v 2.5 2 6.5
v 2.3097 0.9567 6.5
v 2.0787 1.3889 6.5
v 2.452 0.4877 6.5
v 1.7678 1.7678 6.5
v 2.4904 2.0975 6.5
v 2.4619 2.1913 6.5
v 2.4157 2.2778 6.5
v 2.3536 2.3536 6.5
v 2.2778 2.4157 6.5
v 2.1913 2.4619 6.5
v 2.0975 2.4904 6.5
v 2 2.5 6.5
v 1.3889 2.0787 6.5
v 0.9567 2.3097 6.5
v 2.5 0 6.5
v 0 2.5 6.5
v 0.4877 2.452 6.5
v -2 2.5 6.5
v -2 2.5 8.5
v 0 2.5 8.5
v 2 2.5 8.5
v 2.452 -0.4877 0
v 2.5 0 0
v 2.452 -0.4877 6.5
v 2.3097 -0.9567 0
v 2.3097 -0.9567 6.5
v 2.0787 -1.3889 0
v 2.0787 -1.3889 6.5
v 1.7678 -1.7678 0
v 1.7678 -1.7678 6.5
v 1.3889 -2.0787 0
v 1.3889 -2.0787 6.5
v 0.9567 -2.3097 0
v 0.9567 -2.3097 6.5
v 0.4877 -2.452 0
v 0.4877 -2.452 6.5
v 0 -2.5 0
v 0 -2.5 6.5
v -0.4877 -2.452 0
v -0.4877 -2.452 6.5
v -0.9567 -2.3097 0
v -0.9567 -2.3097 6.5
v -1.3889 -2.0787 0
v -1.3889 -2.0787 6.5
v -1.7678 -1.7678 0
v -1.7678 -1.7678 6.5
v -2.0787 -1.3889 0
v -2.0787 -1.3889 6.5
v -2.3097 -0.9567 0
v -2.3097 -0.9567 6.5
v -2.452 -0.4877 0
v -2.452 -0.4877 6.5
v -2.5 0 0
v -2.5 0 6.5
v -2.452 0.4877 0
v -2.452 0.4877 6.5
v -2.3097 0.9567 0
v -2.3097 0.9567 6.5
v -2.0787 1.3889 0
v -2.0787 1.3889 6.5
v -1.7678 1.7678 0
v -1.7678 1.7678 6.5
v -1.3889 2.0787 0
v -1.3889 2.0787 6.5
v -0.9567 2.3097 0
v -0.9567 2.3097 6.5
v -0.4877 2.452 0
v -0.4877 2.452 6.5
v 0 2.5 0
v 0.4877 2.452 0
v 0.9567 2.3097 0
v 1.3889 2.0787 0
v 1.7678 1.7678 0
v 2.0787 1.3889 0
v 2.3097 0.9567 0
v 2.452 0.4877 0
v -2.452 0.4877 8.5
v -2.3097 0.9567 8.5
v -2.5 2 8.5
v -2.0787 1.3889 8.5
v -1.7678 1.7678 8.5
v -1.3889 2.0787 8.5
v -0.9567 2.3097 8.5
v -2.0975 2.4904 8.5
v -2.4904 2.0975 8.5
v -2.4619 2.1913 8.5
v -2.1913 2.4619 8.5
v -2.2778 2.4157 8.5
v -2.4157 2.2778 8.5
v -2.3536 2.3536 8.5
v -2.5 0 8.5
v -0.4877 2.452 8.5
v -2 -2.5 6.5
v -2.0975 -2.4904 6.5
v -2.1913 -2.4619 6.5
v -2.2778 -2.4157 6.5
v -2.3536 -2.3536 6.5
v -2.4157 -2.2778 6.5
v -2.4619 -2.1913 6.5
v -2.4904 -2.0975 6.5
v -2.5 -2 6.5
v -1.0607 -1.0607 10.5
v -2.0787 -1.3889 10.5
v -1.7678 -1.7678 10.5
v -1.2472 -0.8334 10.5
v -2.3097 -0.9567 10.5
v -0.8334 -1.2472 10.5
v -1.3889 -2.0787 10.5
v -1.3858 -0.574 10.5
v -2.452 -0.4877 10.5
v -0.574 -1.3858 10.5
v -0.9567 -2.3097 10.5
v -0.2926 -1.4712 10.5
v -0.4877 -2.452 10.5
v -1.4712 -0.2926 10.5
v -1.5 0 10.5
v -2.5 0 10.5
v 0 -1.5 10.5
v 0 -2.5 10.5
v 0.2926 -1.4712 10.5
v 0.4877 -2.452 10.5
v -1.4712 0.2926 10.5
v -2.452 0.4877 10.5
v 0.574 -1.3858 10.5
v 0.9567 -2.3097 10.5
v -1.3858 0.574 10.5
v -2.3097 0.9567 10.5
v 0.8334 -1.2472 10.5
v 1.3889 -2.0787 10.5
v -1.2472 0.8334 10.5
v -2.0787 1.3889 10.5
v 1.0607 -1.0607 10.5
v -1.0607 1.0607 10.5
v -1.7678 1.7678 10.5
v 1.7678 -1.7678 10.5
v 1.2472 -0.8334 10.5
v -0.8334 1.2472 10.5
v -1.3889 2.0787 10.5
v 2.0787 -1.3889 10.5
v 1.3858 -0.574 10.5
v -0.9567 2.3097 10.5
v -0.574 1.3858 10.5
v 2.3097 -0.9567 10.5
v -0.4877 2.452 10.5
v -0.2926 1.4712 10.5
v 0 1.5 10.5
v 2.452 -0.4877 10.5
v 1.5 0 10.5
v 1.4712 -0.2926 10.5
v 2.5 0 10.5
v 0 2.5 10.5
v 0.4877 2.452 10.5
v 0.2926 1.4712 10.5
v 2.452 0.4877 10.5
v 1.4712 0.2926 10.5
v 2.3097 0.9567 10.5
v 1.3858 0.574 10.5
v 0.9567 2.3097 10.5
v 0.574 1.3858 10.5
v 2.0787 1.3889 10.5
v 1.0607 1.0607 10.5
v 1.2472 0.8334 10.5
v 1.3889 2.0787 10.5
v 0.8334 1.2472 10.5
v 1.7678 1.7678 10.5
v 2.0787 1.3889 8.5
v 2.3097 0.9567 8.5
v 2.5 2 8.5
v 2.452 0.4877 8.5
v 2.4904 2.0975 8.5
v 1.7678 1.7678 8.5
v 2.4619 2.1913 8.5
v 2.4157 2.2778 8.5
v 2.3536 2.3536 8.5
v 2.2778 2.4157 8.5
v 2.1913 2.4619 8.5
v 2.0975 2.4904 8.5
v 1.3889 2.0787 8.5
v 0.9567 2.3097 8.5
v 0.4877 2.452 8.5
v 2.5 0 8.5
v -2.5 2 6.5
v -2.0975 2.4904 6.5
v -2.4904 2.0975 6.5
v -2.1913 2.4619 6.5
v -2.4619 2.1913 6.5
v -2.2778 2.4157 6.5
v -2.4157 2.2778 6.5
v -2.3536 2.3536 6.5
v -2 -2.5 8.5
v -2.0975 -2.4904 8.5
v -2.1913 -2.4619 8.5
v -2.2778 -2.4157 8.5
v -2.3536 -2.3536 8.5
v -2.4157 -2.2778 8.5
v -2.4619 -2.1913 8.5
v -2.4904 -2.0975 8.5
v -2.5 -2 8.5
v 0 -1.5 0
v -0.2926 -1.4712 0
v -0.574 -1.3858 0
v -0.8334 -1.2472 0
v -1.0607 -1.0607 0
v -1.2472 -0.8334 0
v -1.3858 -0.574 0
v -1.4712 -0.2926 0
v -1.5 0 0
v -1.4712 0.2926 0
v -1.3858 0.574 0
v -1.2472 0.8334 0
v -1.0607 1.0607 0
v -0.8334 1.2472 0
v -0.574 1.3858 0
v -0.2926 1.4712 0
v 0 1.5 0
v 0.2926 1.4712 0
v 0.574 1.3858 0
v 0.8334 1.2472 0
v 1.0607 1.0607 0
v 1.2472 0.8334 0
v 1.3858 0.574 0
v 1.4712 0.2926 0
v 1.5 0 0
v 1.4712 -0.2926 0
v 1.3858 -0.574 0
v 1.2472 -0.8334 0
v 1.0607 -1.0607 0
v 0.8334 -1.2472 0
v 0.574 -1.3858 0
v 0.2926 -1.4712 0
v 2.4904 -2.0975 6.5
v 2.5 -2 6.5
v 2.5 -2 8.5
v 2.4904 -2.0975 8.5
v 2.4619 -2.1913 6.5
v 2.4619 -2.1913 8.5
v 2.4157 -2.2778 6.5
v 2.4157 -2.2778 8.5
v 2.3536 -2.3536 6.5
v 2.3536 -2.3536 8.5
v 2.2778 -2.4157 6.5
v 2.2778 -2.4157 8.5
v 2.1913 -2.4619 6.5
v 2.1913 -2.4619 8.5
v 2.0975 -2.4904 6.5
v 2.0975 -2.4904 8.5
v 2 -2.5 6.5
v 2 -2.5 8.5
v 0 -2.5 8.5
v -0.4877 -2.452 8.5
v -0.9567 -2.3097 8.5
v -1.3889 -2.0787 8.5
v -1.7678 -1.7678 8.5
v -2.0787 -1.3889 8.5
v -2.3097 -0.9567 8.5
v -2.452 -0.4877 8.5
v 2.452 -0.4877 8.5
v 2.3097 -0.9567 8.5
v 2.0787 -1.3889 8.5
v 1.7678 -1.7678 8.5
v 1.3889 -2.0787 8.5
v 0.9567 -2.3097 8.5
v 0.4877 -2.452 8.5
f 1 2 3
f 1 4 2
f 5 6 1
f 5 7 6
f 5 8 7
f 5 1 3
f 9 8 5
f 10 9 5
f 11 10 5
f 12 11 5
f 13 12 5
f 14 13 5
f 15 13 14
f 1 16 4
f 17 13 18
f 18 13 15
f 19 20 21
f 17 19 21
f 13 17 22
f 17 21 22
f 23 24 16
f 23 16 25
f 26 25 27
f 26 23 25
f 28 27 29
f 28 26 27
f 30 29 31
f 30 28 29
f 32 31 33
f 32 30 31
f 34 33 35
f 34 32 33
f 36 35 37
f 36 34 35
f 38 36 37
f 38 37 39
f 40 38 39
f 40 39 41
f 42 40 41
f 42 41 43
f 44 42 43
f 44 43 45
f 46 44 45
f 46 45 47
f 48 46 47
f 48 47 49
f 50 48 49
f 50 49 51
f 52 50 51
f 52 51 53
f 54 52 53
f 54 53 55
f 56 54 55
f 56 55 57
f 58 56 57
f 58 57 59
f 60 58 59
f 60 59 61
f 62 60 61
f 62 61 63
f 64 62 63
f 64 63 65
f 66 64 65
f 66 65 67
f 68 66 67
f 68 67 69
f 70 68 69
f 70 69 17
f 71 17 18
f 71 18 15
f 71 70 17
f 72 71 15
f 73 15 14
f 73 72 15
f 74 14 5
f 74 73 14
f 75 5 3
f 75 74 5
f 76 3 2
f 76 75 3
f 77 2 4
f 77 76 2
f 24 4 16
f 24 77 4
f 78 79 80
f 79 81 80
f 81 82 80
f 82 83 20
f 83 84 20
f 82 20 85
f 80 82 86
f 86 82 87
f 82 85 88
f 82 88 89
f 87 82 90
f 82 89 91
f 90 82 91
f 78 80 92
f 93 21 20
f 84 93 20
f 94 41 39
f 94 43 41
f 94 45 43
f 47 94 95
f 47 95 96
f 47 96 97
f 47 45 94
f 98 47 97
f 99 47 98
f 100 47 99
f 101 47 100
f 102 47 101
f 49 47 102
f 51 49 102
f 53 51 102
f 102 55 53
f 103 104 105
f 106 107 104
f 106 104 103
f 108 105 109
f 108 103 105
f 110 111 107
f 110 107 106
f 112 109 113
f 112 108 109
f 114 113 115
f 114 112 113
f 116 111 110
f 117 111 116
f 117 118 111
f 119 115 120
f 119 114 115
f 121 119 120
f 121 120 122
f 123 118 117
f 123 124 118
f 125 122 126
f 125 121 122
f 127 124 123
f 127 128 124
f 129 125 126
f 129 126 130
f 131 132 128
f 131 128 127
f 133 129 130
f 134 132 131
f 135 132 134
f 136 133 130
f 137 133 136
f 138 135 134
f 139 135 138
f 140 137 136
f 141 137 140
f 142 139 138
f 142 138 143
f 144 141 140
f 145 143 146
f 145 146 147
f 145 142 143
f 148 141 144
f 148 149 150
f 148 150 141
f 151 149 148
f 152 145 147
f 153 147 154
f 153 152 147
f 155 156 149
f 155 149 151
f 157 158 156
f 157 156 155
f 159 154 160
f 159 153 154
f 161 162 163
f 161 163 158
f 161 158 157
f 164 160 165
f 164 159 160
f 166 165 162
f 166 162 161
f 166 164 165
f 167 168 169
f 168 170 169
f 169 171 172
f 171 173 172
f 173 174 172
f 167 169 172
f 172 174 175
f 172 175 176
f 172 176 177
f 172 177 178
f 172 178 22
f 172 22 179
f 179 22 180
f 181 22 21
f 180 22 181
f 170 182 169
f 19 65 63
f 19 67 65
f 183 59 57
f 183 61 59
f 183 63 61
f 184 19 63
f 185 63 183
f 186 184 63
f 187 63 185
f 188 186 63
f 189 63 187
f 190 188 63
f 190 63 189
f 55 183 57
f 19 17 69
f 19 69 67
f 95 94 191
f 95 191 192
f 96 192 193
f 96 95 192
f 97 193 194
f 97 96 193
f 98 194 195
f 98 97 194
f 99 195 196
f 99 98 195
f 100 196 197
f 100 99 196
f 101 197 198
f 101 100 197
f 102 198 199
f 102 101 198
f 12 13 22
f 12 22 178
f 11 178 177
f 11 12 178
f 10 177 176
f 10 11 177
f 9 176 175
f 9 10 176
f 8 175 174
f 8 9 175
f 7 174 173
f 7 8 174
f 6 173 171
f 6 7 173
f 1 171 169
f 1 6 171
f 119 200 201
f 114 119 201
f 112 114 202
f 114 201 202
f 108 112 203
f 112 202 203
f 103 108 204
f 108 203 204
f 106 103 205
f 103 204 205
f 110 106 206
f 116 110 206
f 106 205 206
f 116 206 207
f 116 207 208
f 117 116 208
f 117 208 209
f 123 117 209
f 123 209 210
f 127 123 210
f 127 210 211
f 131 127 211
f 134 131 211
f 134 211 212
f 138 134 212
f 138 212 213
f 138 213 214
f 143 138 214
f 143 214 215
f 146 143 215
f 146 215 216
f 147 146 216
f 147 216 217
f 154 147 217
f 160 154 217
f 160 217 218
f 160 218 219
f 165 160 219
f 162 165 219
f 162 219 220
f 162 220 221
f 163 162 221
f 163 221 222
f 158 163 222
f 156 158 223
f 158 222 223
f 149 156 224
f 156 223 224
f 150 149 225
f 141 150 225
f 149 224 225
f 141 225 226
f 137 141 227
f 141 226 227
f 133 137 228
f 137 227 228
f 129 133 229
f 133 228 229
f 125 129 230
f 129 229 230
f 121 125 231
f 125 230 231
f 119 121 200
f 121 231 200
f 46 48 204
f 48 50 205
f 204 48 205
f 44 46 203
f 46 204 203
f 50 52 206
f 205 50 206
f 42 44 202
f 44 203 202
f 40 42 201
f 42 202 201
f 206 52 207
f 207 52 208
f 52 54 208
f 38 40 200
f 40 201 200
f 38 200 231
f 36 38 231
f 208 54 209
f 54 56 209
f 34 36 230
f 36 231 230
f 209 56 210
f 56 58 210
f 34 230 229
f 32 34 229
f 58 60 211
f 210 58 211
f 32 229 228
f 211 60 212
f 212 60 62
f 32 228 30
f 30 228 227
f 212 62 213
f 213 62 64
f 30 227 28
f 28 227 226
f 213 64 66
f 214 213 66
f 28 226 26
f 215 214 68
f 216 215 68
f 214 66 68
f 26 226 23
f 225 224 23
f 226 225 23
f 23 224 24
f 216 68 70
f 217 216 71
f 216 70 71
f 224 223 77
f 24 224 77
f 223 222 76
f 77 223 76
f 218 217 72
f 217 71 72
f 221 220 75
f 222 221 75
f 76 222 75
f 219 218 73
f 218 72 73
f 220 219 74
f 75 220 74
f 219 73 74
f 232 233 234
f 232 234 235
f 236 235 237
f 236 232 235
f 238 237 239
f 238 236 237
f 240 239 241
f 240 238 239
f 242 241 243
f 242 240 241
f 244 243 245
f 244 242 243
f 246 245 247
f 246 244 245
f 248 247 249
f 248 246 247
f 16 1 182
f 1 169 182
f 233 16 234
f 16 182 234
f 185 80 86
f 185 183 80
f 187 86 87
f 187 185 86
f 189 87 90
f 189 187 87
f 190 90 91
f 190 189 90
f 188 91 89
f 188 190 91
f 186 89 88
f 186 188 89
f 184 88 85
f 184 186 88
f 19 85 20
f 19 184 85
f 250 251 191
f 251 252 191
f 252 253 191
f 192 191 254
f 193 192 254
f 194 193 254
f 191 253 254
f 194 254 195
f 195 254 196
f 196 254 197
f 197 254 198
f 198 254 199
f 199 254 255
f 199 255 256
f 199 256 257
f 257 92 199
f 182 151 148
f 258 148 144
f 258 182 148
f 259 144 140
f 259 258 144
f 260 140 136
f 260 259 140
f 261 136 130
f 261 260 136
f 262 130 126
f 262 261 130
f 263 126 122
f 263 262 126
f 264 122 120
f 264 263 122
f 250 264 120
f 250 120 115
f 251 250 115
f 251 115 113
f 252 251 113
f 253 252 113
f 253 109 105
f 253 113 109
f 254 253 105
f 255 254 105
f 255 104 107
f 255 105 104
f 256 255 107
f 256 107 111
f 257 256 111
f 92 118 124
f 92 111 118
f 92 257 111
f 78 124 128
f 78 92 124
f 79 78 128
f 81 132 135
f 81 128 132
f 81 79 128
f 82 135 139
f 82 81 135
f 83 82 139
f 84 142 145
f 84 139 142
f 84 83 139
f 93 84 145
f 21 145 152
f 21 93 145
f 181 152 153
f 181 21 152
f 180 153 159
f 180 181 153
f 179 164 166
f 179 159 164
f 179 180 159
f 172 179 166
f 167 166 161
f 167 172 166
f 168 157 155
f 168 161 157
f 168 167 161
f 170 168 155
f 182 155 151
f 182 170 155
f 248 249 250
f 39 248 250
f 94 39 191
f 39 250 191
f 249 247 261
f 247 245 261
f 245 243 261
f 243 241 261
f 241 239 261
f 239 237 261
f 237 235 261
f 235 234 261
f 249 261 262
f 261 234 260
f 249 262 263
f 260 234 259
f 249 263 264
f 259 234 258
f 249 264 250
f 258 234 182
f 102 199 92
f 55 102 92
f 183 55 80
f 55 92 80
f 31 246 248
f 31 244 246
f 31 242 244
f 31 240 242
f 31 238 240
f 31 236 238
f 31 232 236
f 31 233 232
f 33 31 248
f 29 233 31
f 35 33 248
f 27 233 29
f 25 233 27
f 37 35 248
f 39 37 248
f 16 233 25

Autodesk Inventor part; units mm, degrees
ref_plane "YZ Plane" through (0, 0, 0) normal (1, 0, 0) x (0, 1, 0)
ref_plane "XZ Plane" through (0, 0, 0) normal (0, 1, 0) x (-1, 0, 0)
sketch "Skizze1" plane through (0, 0, 0) normal (0, 0, 1) x (1, 0, 0)
  circle A0 centre (0, 0) radius 2.5
  dimension "d1" = 5
extrude "Extrusion1" add sketch "Skizze1" along normal blind 10.5
thread "Gewinde1" size "M5x0.8" class "6g" standard "ANSI Metric M Profile" length 4.5
sketch "Skizze2" plane through (0, 0, 10.5) normal (0, 0, 1) x (1, 0, 0)
  circle A0 centre (0, 0) radius 1.5 projected
ref_plane "Arbeitsebene1" through (0, 0, 8.5) normal (0, 0, -1) x (-1, 0, 0)
sketch "Skizze3" plane through (0, 0, 8.5) normal (0, 0, -1) x (-1, 0, 0)
  line L0 (-2.5, -2.5) -> (2.5, -2.5)
  line L1 (2.5, -2.5) -> (2.5, 2.5)
  line L2 (2.5, 2.5) -> (-2.5, 2.5)
  line L3 (-2.5, 2.5) -> (-2.5, -2.5)
  line L4 (-2.5, -2.5) -> (2.5, 2.5) construction
  line L5 (2.5, -2.5) -> (-2.5, 2.5) construction
  point P0 (0, 0)
extrude "Extrusion3" add sketch "Skizze3" along normal blind 2
fillet "Rundung2" radius 0.5 4 edges at (2.5, -2.5, 7.5) (2.5, 2.5, 7.5) (-2.5, -2.5, 7.5) (-2.5, 2.5, 7.5)
hole "Bohrung2" at (0, 0, 10.5) direction (0, 0, -1) diameter 3 end through all
properties part number "RadAdapterSchaft"
